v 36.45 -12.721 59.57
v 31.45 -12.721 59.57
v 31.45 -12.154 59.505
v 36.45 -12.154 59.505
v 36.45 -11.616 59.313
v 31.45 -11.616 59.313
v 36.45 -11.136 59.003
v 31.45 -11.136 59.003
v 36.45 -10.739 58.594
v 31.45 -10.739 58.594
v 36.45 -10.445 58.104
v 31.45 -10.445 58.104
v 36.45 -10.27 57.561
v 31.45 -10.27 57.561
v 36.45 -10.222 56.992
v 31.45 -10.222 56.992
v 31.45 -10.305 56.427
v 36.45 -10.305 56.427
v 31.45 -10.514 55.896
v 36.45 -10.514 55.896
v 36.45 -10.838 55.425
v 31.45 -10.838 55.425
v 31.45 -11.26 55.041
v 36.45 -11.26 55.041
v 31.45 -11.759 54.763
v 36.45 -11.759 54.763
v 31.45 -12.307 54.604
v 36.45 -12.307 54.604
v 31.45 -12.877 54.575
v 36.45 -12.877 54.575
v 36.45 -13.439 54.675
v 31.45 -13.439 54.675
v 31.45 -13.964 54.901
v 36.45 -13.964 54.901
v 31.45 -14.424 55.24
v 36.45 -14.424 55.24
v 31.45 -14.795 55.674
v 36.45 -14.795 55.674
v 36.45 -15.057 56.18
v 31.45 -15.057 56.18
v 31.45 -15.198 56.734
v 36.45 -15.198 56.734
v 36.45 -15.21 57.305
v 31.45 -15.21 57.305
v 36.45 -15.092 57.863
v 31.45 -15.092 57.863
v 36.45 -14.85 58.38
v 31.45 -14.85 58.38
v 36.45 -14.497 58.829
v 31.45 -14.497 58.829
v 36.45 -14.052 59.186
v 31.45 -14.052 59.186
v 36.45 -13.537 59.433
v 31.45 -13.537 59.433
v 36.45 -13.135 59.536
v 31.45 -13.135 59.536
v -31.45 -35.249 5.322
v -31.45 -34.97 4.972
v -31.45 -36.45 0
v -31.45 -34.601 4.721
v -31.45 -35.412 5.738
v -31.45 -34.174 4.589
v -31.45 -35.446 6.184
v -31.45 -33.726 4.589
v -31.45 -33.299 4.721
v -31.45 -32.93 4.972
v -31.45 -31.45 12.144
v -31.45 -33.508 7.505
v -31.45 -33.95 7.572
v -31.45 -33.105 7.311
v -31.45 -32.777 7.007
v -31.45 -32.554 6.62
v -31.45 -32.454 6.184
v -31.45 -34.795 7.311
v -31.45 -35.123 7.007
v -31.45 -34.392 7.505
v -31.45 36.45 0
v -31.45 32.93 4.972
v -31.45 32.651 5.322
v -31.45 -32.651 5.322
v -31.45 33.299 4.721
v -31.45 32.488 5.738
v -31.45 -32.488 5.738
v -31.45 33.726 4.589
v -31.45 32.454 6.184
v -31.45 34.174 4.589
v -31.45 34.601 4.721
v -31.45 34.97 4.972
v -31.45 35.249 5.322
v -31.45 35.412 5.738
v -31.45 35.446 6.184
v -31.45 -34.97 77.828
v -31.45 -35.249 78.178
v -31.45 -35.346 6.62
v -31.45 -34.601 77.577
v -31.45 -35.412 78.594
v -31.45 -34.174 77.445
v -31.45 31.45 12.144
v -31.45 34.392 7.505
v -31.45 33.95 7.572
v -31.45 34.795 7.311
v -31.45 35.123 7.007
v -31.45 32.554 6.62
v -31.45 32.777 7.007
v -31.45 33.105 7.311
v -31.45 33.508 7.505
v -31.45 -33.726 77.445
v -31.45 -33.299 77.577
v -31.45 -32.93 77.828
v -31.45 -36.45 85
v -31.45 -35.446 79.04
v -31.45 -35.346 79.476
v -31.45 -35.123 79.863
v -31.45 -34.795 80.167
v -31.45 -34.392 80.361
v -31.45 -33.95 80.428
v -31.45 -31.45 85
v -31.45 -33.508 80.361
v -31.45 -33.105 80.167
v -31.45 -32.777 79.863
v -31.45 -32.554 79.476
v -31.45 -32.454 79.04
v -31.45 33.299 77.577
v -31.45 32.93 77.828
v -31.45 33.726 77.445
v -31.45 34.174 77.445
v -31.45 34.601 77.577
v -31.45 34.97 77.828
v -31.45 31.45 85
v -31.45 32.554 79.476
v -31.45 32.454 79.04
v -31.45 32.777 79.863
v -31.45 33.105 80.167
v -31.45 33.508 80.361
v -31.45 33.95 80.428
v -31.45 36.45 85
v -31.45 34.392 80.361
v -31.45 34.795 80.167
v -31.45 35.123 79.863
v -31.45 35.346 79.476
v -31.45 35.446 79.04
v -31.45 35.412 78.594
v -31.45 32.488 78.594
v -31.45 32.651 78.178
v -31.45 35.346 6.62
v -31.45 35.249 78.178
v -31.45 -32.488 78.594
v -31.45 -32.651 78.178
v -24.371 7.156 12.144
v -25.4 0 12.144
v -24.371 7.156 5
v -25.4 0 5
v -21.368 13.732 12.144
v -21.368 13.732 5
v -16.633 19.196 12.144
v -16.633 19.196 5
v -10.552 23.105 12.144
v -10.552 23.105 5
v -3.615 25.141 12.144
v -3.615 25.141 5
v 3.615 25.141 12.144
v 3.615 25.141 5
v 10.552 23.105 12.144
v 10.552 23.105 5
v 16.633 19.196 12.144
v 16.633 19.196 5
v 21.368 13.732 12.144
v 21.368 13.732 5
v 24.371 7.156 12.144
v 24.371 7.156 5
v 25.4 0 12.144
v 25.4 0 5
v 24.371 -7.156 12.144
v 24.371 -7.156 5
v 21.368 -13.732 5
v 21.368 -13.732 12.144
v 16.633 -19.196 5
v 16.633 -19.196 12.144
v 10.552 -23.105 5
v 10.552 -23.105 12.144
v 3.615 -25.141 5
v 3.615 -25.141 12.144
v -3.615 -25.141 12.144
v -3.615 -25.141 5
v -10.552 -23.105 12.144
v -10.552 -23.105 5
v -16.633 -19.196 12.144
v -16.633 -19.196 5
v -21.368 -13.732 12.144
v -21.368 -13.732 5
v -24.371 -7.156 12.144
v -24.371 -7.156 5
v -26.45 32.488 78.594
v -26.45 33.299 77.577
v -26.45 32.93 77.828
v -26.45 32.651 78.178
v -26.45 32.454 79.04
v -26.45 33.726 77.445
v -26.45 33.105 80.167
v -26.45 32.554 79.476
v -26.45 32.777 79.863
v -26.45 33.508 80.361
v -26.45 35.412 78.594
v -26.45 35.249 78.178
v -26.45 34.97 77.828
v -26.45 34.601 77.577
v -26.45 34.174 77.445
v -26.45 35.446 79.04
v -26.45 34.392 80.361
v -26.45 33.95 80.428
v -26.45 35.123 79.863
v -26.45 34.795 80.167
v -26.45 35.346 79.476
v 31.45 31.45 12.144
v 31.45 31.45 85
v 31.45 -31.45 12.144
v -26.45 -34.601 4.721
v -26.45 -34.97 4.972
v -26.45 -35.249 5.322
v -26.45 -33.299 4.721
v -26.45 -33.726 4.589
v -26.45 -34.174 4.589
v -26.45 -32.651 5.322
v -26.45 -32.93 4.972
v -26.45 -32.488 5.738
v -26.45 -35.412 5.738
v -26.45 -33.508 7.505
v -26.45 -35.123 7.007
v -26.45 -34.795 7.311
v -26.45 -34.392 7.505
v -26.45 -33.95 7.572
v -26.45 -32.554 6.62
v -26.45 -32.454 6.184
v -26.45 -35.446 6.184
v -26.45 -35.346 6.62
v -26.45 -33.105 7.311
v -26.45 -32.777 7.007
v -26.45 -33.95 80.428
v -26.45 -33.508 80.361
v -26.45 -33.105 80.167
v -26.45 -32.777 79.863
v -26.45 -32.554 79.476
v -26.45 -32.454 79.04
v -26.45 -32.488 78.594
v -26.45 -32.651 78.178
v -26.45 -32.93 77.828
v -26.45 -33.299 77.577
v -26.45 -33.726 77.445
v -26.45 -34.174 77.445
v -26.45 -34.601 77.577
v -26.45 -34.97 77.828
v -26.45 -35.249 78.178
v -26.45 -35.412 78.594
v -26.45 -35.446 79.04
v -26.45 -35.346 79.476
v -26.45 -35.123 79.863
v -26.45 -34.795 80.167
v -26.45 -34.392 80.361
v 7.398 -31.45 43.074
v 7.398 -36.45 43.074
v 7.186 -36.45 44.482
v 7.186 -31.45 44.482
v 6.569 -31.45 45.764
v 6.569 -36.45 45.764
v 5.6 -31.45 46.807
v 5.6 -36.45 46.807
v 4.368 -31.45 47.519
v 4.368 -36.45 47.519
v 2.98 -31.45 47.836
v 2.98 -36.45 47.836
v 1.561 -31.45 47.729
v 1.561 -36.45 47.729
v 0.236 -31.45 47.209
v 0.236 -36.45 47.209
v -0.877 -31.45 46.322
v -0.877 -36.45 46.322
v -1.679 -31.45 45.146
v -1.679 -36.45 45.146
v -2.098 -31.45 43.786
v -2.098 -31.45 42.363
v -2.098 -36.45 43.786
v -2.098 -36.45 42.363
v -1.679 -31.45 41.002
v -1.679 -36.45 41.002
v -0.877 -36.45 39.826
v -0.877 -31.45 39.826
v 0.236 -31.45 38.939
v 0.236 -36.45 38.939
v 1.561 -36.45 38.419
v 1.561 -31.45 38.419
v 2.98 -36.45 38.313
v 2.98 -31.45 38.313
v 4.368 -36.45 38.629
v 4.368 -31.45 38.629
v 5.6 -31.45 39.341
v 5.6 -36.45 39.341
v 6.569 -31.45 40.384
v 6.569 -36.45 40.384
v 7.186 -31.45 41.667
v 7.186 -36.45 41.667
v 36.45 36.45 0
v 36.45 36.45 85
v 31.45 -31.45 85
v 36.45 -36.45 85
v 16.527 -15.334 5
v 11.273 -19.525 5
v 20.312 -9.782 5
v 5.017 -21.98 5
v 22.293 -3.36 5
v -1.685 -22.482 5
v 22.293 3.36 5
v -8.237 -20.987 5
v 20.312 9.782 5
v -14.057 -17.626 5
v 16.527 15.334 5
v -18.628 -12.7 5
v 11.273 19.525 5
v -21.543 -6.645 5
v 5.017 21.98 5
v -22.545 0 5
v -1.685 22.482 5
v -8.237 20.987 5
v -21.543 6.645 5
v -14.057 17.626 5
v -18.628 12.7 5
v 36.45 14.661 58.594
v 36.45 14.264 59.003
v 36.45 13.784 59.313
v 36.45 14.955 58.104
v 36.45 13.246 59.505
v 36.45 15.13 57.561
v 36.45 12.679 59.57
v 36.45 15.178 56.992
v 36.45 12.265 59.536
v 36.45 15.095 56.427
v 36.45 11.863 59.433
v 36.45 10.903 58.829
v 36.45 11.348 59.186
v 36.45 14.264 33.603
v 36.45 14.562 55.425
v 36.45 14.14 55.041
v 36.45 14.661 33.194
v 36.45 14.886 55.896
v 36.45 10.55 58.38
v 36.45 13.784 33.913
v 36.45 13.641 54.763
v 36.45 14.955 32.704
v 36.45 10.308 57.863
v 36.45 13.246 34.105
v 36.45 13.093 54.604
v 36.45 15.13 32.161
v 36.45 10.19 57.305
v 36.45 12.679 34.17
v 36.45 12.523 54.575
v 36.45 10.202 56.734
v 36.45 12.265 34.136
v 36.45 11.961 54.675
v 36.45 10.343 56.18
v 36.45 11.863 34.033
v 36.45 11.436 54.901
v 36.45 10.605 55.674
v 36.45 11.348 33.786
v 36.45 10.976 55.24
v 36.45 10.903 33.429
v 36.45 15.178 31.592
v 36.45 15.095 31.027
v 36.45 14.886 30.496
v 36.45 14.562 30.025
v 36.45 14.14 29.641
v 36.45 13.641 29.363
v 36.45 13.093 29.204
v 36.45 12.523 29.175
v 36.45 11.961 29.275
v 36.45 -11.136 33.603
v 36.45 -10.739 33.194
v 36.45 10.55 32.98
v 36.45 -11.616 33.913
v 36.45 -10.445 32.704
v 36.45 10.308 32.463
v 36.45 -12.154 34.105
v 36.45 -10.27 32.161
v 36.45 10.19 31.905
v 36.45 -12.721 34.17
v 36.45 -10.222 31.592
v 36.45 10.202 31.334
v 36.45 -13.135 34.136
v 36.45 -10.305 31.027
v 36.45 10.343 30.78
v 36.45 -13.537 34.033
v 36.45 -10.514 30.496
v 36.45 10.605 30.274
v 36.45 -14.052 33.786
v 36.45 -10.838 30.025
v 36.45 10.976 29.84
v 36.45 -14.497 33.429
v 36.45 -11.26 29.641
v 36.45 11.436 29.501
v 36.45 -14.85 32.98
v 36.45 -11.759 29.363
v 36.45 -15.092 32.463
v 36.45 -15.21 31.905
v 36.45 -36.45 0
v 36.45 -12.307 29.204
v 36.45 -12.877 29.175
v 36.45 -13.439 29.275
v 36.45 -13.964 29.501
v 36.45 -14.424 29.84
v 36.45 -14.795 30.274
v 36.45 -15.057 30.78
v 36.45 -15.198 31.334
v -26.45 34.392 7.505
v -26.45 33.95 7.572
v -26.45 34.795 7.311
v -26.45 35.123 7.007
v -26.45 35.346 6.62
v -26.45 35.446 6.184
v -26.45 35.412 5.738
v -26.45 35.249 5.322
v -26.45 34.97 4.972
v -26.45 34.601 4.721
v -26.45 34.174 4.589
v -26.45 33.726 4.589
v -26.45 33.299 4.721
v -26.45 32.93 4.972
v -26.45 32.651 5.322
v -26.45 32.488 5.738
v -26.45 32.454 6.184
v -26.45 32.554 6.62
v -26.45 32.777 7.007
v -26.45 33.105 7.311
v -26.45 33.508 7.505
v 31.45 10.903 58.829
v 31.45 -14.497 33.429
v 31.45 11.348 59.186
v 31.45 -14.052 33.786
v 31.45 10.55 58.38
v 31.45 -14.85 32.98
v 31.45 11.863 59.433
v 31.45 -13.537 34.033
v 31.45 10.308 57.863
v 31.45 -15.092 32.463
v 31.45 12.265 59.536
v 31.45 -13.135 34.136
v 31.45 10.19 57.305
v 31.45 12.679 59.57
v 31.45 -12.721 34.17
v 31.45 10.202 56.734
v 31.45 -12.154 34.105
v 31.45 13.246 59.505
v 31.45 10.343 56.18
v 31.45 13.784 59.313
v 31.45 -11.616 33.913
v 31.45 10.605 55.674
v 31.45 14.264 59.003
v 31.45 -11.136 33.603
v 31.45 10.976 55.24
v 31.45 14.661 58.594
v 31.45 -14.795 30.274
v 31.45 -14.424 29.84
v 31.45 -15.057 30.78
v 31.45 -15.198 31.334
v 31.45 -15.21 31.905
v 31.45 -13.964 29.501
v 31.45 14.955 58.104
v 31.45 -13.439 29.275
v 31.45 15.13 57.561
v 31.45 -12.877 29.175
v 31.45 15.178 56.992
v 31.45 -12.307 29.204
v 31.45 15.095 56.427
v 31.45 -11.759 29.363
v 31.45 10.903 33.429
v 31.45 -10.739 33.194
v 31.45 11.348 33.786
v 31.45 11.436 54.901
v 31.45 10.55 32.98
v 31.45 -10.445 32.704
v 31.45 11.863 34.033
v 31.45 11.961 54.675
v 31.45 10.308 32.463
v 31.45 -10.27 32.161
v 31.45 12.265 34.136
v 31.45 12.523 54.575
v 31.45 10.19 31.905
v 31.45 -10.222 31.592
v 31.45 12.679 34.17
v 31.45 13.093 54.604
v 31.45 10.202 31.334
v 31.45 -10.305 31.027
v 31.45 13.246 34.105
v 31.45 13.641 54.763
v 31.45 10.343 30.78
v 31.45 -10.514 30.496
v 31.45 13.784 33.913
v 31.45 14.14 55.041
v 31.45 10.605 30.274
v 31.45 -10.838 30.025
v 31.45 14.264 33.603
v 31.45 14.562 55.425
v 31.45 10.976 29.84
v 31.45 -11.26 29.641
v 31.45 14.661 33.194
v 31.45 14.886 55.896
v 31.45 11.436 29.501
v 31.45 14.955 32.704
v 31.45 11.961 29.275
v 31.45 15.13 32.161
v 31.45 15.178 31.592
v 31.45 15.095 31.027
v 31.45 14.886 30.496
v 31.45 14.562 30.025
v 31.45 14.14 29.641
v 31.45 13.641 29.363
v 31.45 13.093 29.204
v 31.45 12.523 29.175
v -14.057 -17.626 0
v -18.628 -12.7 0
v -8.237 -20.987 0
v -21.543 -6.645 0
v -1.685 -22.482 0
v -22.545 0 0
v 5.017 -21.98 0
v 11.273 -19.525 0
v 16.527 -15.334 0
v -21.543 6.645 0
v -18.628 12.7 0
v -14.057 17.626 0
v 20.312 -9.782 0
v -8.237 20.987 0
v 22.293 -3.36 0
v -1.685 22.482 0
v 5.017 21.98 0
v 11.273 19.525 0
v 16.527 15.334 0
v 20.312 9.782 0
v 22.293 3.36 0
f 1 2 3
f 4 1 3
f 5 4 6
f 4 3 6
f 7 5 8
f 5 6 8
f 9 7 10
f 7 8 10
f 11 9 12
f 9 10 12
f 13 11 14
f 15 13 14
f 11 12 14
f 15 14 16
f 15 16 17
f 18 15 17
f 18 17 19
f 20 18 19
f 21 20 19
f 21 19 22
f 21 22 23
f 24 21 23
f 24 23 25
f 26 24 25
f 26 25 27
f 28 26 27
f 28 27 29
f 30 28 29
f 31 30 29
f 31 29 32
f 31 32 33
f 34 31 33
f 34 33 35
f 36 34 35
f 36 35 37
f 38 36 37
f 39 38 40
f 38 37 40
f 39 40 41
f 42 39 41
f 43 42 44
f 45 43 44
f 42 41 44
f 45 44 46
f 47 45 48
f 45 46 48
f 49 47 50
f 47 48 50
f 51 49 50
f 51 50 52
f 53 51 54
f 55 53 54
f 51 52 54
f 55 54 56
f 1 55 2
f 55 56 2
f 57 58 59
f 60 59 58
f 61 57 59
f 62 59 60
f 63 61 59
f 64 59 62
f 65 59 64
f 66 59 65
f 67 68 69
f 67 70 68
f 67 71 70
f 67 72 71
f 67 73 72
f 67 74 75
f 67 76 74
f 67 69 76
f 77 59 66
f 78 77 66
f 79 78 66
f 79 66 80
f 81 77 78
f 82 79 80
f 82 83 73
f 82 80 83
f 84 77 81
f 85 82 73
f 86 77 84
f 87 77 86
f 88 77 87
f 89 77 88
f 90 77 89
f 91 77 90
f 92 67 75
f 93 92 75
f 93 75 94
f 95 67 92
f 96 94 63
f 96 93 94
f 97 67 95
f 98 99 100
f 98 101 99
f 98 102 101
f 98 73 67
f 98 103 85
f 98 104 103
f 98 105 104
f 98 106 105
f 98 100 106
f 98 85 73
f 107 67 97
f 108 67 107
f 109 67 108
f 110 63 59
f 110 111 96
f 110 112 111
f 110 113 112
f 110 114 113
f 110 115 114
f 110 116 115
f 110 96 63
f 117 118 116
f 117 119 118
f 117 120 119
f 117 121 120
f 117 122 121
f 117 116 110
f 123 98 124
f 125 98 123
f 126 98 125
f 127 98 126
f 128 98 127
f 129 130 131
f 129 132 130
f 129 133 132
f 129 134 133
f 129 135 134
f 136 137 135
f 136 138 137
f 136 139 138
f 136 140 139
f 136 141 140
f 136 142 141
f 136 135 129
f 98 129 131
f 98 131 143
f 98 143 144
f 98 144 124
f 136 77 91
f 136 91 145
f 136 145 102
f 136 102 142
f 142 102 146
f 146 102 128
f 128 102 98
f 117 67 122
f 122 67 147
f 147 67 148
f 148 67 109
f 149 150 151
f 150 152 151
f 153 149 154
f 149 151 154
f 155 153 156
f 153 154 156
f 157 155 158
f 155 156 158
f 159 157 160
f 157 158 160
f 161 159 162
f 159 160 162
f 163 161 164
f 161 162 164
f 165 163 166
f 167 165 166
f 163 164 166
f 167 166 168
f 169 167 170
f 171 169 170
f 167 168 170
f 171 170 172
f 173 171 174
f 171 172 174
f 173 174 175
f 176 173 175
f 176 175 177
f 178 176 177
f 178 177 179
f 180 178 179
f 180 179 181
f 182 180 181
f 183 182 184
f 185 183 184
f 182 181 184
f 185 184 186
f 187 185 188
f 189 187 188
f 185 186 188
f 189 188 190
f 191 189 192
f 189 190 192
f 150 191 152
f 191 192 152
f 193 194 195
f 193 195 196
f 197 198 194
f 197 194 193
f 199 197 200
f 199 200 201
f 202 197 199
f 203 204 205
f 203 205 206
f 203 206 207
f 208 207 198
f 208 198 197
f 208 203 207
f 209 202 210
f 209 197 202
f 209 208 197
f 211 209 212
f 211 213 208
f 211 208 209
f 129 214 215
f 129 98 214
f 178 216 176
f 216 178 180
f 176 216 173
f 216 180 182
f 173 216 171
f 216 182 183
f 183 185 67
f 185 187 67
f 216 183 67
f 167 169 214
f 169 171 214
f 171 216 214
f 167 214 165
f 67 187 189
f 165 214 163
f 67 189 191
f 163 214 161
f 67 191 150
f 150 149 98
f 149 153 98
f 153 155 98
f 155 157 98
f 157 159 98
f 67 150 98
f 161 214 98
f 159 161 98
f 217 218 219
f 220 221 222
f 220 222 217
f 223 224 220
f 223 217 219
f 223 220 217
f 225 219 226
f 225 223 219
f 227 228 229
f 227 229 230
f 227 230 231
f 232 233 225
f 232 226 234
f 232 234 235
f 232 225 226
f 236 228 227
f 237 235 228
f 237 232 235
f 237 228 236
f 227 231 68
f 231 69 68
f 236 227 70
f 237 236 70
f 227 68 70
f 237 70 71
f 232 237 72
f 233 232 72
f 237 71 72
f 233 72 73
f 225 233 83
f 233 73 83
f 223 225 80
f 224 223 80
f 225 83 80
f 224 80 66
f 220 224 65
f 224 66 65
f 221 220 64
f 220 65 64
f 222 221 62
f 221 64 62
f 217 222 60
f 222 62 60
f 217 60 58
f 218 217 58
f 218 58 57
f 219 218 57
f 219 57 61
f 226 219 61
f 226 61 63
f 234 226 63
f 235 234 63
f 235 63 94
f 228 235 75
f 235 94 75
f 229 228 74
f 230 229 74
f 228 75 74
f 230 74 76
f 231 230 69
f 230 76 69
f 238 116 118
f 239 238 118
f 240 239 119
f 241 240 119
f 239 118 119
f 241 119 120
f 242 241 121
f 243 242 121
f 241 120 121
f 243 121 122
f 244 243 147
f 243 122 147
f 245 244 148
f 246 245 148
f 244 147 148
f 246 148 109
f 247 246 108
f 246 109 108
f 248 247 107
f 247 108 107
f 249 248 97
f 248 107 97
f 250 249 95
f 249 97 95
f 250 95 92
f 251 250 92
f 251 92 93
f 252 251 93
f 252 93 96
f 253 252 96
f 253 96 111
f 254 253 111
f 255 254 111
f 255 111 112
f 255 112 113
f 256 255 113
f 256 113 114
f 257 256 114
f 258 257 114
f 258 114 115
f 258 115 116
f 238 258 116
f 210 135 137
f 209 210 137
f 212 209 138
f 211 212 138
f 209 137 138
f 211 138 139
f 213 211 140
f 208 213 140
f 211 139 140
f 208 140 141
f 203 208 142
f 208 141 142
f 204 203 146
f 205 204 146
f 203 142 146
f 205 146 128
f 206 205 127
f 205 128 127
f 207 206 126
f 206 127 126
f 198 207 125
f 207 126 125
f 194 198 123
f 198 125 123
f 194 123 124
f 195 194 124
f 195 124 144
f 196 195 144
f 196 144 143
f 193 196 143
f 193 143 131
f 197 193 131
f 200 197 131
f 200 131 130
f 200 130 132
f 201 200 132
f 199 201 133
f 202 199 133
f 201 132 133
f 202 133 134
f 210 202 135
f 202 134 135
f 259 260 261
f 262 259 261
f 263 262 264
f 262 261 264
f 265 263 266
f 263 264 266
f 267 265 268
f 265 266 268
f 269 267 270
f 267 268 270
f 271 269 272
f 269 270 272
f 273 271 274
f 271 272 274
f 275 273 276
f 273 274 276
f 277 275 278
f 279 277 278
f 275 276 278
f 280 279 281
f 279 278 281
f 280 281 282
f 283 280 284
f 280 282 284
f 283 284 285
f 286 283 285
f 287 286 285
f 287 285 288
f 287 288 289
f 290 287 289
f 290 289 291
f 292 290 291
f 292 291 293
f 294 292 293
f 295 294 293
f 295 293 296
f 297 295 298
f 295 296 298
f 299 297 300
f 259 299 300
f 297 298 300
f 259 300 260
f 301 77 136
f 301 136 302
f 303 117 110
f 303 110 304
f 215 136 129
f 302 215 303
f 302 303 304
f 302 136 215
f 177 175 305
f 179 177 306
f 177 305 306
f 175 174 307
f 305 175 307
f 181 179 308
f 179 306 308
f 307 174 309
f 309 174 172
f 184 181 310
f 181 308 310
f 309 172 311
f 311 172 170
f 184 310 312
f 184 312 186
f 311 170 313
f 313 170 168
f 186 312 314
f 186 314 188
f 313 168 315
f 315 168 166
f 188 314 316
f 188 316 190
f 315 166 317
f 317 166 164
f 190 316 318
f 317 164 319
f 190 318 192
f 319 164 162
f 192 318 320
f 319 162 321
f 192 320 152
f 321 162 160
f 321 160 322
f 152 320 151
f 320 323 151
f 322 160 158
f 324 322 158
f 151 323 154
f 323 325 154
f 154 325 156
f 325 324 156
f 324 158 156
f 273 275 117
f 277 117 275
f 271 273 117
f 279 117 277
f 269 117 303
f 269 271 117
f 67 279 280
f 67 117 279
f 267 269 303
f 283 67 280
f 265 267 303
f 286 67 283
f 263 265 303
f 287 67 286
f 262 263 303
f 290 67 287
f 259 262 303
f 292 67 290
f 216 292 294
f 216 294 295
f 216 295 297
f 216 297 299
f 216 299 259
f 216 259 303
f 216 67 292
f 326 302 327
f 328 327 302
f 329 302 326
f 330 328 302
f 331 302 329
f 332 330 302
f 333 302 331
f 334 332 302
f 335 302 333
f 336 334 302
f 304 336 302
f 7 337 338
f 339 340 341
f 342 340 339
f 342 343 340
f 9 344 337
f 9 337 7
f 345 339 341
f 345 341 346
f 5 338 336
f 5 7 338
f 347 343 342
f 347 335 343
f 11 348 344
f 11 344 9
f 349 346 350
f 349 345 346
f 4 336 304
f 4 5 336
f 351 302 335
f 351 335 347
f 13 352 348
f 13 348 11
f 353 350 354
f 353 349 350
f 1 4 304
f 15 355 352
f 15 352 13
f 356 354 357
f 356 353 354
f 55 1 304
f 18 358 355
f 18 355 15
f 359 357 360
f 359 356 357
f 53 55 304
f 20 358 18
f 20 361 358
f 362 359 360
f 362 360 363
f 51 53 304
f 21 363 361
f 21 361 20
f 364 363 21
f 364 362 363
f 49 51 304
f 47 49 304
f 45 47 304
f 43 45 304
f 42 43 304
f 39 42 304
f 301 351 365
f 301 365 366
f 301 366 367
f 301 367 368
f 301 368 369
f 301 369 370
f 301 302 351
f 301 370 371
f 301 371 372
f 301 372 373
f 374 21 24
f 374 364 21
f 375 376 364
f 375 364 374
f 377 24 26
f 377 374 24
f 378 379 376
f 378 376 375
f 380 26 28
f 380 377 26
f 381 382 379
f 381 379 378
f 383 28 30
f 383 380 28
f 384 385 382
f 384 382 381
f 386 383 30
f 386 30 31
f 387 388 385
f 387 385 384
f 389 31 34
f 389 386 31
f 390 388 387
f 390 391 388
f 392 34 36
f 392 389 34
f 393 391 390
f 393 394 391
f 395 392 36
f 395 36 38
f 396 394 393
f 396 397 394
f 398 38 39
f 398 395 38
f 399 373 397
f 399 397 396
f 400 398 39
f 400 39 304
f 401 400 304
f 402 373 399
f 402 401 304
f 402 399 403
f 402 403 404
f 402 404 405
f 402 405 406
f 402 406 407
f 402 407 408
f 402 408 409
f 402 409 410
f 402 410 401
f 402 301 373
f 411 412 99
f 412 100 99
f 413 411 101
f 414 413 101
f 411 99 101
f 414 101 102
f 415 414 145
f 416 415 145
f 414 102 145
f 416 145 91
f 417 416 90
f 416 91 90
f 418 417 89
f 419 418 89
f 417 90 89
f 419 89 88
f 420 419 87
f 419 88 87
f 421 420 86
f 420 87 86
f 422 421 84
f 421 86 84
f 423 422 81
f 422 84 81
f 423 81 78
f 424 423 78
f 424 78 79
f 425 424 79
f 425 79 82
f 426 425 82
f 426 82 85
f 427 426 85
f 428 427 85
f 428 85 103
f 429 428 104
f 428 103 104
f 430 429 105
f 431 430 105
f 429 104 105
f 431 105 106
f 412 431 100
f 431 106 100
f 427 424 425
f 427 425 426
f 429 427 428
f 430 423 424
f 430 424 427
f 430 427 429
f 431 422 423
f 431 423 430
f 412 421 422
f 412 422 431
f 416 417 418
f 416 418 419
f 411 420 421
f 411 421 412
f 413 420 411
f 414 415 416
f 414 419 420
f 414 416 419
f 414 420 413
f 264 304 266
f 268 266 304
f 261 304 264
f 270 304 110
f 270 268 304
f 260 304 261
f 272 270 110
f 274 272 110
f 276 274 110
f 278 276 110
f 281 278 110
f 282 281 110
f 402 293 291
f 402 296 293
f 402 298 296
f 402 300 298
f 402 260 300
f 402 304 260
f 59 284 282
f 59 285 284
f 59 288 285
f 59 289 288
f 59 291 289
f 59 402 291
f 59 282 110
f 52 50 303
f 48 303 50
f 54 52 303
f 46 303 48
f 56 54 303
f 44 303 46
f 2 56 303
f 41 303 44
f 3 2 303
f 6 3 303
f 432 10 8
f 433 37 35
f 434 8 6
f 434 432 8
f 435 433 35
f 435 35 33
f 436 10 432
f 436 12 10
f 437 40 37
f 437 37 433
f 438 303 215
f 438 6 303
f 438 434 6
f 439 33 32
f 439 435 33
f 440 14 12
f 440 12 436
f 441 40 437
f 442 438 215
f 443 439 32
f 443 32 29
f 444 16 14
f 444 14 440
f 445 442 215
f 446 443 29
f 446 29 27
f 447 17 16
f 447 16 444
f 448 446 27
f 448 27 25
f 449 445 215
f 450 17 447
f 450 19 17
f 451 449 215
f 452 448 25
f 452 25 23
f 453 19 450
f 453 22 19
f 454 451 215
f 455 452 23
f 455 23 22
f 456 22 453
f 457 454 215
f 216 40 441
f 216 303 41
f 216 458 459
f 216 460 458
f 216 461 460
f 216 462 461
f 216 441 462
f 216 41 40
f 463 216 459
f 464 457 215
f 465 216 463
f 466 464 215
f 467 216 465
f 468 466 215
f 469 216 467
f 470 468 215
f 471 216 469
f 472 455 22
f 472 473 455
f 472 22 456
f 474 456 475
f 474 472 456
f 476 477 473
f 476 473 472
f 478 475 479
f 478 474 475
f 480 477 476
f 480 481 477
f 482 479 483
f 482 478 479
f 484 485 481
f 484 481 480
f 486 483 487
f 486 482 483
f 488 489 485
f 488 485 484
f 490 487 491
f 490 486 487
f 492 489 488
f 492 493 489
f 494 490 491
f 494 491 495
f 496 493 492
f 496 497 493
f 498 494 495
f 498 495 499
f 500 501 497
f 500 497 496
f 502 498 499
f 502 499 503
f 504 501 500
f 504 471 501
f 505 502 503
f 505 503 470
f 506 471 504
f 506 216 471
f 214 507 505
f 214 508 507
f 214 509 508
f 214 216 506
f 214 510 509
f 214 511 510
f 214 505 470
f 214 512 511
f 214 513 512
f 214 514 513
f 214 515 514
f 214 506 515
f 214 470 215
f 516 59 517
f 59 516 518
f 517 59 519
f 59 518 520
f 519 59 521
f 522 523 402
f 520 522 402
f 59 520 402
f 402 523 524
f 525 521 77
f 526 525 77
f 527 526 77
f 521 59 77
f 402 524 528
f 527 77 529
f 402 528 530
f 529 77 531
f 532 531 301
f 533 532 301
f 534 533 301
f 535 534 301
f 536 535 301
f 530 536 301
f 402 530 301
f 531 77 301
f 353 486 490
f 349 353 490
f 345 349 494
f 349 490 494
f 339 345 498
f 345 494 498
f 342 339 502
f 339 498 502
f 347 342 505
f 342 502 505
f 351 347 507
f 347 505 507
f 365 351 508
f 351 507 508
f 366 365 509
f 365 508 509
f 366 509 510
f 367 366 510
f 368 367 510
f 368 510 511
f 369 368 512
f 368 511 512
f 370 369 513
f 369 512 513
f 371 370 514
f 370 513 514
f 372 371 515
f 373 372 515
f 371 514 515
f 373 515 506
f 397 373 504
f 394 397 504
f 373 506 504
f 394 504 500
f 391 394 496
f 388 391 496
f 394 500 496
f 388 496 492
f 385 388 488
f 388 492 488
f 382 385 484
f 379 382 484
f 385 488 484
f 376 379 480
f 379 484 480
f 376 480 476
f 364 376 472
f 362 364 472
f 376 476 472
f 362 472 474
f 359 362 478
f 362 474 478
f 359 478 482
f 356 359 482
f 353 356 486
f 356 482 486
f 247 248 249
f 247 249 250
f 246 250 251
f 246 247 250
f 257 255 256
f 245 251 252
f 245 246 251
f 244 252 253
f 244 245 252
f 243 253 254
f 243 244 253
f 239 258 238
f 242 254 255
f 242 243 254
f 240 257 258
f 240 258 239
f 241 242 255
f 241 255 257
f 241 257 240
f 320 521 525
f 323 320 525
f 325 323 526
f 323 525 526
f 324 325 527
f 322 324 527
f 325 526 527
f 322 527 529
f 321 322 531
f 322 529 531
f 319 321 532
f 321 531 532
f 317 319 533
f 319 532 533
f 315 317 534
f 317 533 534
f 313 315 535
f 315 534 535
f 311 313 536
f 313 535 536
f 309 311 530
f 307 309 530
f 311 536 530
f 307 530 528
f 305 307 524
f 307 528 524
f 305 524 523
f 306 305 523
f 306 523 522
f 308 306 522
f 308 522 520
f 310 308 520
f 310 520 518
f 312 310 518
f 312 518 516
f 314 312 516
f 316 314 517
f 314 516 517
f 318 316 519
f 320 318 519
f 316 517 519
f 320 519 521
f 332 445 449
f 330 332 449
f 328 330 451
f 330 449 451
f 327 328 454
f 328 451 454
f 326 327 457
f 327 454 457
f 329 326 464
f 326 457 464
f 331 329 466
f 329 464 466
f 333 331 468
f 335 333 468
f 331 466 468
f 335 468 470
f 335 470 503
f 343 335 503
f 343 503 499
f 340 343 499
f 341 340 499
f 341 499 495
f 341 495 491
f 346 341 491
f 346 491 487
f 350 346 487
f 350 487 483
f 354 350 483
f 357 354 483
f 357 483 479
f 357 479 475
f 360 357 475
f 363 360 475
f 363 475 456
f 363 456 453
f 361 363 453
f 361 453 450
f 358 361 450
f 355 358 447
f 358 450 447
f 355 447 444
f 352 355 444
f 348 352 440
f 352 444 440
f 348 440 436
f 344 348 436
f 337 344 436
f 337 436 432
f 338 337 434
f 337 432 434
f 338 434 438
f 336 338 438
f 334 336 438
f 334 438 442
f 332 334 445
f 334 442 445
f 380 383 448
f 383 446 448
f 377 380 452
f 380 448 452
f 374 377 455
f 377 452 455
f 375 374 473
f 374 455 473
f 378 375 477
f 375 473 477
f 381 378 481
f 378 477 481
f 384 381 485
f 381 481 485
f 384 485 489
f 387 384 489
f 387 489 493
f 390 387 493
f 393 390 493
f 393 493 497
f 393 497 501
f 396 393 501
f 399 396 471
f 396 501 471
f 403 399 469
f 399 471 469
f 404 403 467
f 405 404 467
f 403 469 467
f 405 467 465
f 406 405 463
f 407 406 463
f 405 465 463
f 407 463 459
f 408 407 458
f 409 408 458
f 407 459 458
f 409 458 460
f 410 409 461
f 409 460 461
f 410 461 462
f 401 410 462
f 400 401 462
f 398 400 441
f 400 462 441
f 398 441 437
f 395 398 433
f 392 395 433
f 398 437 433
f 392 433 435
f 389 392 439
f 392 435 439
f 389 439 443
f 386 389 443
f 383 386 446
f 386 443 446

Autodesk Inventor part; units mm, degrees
ref_plane "YZ Plane" through (0, 0, 0) normal (1, 0, 0) x (0, 1, 0)
ref_plane "XZ Plane" through (0, 0, 0) normal (0, 1, 0) x (-1, 0, 0)
ref_plane "XY Plane" through (0, 0, 0) normal (0, 0, 1) x (1, 0, 0)
sketch "Sketch1" plane through (0, 0, 0) normal (0, 0, 1) x (1, 0, 0)
  line L0 (-31.45, -31.45) -> (31.45, -31.45)
  line L1 (31.45, -31.45) -> (31.45, 31.45)
  line L2 (31.45, 31.45) -> (-31.45, 31.45)
  line L3 (-31.45, 31.45) -> (-31.45, -31.45)
  line L4 (-31.45, -31.45) -> (31.45, 31.45) construction
  line L5 (31.45, -31.45) -> (-31.45, 31.45) construction
  line L6 (-36.45, 36.45) -> (36.45, 36.45)
  line L7 (36.45, 36.45) -> (36.45, -36.45)
  line L8 (36.45, -36.45) -> (-36.45, -36.45)
  line L9 (-36.45, -36.45) -> (-36.45, 36.45)
  point P0 (0, 0)
  dimension "d0" = 62.9
  dimension "d1" = 62.9
  dimension "d2" = 5
extrude "Extrusion1" add sketch "Sketch1" along normal blind 85
sketch "Sketch2" plane through (0, 0, 0) normal (0, 0, -1) x (-1, 0, 0)
  line L0 (31.45, 31.45) -> (-31.45, 31.45) projected
  line L1 (31.45, -31.45) -> (-31.45, -31.45)
  line L2 (-31.45, -31.45) -> (-31.45, 31.45)
  line L3 (-31.45, 31.45) -> (31.45, 31.45)
  line L4 (31.45, 31.45) -> (31.45, -31.45)
  line L5 (31.45, -31.45) -> (-31.45, 31.45) construction
  line L6 (-31.45, -31.45) -> (31.45, 31.45) construction
  point P0 (0, 0)
  point P1 (31.45, 31.45)
extrude "Extrusion2" add sketch "Sketch2" against normal blind 12.144
sketch "Sketch3" plane through (-36.45, -36.45, 0) normal (-1, 0, 0) x (0, 0, 1)
  line L0 (85, 0) -> (85, 72.9) projected
  line L1 (85, 0) -> (0, 0)
  line L2 (0, 0) -> (0, 67.9)
  line L3 (0, 67.9) -> (85, 67.9)
  line L4 (85, 67.9) -> (85, 0)
  point P0 (0, 36.45)
extrude "Extrusion3" cut sketch "Sketch3" against normal blind 5
sketch "Sketch4" plane through (0, 0, 0) normal (0, 0, -1) x (-1, 0, 0)
  point P0 (0, 0)
sketch "Sketch5" plane through (-36.45, 31.45, 0) normal (-1, 0, 0) x (0, 0, 1)
  line L0 (0, 5) -> (0, 0) projected
  line L1 (0, 5) -> (85, 5) projected
  line L2 (0, 0) -> (85, 0) projected
  line L3 (85, 5) -> (85, 0) projected
  point P0 (0, -31.45)
extrude "Extrusion4" cut sketch "Sketch5" against normal blind 5
sketch "Sketch6" plane through (0, 0, 0) normal (0, 0, -1) x (-1, 0, 0)
  circle A0 centre (0, 0) radius 22.545
  dimension "d11" = 45.09
extrude "Extrusion5" cut sketch "Sketch6" against normal blind 5
sketch "Sketch7" plane through (0, 0, 5) normal (0, 0, -1) x (-1, 0, 0)
  circle A0 centre (0, 0) radius 25.4
  dimension "d14" = 50.8
sketch "Sketch8" plane through (0, 0, 12.144) normal (0, 0, 1) x (1, 0, 0)
  point P0 (0, 0)
extrude "Extrusion6" cut sketch "Sketch7" against normal blind 10
sketch "Sketch12" plane through (36.45, 36.45, 85) normal (0, 1, 0) x (1, 0, 0)
  circle A0 centre (-33.8267, 41.9258) radius 12.7 projected
  point P0 (-36.45, 85)
extrude "Extrusion10" cut sketch "Sketch12" along normal blind 5
sketch "Sketch13" plane through (31.45, -31.45, 85) normal (-1, 0, 0) x (0, 0, 1)
  ellipse E0 centre (-53.33, 18.7291) end of major axis (-50.83, 18.7291) minor radius 2.5 projected
  ellipse E1 centre (-27.93, 44.1291) end of major axis (-25.43, 44.1291) minor radius 2.5 projected
  ellipse E2 centre (-53.33, 44.1291) end of major axis (-50.83, 44.1291) minor radius 2.5 projected
  ellipse E3 centre (-27.93, 18.7291) end of major axis (-25.43, 18.7291) minor radius 2.5 projected
  point P0 (-85, 31.45)
extrude "Extrusion11" cut sketch "Sketch13" against normal blind 5
sketch "Sketch14" plane through (-31.45, -36.45, 0) normal (-1, 0, 0) x (0, 0, 1)
  circle A0 centre (6.072, 70.4) radius 1.5
  line L0 (0, 72.9) -> (85, 72.9) projected
  line L1 (0, 0) -> (0, 67.9) projected
  line L2 (12.144, 5) -> (12.144, 67.9) projected
  circle A1 centre (6.072, 2.5) radius 1.5
  line L3 (85, 0) -> (0, 0) projected
  circle A2 centre (78.928, 70.4) radius 1.5
  circle A3 centre (78.928, 2.5) radius 1.5
  line L4 (85, 5) -> (85, 0) projected
  point P0 (0, 36.45)
  dimension "d43" = 3
  dimension "d44" = 2.5
  dimension "d45" = 6.072
  dimension "d46" = 12.144
  dimension "d47" = 3
  dimension "d48" = 2.5
  dimension "d49" = 6.072
  dimension "d50" = 3
  dimension "d51" = 6.072
  dimension "d52" = 2.5
  dimension "d53" = 3
  dimension "d54" = 6.072
extrude "Extrusion12" cut sketch "Sketch14" against normal blind 5
thread "Thread5" size "M3x0.5" class "6H" standard "ANSI Metric M Profile" full length
thread "Thread6" size "M3x0.5" class "6H" standard "ANSI Metric M Profile" full length
thread "Thread7" size "M3x0.5" class "6H" standard "ANSI Metric M Profile" full length
thread "Thread8" size "M3x0.5" class "6H" standard "ANSI Metric M Profile" full length
sketch "Sketch15" plane through (36.45, -36.45, 0) normal (0, -1, 0) x (1, 0, 0)
  circle A0 centre (-33.8267, 43.0742) radius 12.7 projected
  circle A1 centre (-33.8267, 43.0742) radius 4.775
  point P0 (-36.45, 0)
  dimension "d65" = 9.55
extrude "Extrusion13" cut sketch "Sketch15" against normal blind 5 contours A1
properties part number "soporte 2.0"
